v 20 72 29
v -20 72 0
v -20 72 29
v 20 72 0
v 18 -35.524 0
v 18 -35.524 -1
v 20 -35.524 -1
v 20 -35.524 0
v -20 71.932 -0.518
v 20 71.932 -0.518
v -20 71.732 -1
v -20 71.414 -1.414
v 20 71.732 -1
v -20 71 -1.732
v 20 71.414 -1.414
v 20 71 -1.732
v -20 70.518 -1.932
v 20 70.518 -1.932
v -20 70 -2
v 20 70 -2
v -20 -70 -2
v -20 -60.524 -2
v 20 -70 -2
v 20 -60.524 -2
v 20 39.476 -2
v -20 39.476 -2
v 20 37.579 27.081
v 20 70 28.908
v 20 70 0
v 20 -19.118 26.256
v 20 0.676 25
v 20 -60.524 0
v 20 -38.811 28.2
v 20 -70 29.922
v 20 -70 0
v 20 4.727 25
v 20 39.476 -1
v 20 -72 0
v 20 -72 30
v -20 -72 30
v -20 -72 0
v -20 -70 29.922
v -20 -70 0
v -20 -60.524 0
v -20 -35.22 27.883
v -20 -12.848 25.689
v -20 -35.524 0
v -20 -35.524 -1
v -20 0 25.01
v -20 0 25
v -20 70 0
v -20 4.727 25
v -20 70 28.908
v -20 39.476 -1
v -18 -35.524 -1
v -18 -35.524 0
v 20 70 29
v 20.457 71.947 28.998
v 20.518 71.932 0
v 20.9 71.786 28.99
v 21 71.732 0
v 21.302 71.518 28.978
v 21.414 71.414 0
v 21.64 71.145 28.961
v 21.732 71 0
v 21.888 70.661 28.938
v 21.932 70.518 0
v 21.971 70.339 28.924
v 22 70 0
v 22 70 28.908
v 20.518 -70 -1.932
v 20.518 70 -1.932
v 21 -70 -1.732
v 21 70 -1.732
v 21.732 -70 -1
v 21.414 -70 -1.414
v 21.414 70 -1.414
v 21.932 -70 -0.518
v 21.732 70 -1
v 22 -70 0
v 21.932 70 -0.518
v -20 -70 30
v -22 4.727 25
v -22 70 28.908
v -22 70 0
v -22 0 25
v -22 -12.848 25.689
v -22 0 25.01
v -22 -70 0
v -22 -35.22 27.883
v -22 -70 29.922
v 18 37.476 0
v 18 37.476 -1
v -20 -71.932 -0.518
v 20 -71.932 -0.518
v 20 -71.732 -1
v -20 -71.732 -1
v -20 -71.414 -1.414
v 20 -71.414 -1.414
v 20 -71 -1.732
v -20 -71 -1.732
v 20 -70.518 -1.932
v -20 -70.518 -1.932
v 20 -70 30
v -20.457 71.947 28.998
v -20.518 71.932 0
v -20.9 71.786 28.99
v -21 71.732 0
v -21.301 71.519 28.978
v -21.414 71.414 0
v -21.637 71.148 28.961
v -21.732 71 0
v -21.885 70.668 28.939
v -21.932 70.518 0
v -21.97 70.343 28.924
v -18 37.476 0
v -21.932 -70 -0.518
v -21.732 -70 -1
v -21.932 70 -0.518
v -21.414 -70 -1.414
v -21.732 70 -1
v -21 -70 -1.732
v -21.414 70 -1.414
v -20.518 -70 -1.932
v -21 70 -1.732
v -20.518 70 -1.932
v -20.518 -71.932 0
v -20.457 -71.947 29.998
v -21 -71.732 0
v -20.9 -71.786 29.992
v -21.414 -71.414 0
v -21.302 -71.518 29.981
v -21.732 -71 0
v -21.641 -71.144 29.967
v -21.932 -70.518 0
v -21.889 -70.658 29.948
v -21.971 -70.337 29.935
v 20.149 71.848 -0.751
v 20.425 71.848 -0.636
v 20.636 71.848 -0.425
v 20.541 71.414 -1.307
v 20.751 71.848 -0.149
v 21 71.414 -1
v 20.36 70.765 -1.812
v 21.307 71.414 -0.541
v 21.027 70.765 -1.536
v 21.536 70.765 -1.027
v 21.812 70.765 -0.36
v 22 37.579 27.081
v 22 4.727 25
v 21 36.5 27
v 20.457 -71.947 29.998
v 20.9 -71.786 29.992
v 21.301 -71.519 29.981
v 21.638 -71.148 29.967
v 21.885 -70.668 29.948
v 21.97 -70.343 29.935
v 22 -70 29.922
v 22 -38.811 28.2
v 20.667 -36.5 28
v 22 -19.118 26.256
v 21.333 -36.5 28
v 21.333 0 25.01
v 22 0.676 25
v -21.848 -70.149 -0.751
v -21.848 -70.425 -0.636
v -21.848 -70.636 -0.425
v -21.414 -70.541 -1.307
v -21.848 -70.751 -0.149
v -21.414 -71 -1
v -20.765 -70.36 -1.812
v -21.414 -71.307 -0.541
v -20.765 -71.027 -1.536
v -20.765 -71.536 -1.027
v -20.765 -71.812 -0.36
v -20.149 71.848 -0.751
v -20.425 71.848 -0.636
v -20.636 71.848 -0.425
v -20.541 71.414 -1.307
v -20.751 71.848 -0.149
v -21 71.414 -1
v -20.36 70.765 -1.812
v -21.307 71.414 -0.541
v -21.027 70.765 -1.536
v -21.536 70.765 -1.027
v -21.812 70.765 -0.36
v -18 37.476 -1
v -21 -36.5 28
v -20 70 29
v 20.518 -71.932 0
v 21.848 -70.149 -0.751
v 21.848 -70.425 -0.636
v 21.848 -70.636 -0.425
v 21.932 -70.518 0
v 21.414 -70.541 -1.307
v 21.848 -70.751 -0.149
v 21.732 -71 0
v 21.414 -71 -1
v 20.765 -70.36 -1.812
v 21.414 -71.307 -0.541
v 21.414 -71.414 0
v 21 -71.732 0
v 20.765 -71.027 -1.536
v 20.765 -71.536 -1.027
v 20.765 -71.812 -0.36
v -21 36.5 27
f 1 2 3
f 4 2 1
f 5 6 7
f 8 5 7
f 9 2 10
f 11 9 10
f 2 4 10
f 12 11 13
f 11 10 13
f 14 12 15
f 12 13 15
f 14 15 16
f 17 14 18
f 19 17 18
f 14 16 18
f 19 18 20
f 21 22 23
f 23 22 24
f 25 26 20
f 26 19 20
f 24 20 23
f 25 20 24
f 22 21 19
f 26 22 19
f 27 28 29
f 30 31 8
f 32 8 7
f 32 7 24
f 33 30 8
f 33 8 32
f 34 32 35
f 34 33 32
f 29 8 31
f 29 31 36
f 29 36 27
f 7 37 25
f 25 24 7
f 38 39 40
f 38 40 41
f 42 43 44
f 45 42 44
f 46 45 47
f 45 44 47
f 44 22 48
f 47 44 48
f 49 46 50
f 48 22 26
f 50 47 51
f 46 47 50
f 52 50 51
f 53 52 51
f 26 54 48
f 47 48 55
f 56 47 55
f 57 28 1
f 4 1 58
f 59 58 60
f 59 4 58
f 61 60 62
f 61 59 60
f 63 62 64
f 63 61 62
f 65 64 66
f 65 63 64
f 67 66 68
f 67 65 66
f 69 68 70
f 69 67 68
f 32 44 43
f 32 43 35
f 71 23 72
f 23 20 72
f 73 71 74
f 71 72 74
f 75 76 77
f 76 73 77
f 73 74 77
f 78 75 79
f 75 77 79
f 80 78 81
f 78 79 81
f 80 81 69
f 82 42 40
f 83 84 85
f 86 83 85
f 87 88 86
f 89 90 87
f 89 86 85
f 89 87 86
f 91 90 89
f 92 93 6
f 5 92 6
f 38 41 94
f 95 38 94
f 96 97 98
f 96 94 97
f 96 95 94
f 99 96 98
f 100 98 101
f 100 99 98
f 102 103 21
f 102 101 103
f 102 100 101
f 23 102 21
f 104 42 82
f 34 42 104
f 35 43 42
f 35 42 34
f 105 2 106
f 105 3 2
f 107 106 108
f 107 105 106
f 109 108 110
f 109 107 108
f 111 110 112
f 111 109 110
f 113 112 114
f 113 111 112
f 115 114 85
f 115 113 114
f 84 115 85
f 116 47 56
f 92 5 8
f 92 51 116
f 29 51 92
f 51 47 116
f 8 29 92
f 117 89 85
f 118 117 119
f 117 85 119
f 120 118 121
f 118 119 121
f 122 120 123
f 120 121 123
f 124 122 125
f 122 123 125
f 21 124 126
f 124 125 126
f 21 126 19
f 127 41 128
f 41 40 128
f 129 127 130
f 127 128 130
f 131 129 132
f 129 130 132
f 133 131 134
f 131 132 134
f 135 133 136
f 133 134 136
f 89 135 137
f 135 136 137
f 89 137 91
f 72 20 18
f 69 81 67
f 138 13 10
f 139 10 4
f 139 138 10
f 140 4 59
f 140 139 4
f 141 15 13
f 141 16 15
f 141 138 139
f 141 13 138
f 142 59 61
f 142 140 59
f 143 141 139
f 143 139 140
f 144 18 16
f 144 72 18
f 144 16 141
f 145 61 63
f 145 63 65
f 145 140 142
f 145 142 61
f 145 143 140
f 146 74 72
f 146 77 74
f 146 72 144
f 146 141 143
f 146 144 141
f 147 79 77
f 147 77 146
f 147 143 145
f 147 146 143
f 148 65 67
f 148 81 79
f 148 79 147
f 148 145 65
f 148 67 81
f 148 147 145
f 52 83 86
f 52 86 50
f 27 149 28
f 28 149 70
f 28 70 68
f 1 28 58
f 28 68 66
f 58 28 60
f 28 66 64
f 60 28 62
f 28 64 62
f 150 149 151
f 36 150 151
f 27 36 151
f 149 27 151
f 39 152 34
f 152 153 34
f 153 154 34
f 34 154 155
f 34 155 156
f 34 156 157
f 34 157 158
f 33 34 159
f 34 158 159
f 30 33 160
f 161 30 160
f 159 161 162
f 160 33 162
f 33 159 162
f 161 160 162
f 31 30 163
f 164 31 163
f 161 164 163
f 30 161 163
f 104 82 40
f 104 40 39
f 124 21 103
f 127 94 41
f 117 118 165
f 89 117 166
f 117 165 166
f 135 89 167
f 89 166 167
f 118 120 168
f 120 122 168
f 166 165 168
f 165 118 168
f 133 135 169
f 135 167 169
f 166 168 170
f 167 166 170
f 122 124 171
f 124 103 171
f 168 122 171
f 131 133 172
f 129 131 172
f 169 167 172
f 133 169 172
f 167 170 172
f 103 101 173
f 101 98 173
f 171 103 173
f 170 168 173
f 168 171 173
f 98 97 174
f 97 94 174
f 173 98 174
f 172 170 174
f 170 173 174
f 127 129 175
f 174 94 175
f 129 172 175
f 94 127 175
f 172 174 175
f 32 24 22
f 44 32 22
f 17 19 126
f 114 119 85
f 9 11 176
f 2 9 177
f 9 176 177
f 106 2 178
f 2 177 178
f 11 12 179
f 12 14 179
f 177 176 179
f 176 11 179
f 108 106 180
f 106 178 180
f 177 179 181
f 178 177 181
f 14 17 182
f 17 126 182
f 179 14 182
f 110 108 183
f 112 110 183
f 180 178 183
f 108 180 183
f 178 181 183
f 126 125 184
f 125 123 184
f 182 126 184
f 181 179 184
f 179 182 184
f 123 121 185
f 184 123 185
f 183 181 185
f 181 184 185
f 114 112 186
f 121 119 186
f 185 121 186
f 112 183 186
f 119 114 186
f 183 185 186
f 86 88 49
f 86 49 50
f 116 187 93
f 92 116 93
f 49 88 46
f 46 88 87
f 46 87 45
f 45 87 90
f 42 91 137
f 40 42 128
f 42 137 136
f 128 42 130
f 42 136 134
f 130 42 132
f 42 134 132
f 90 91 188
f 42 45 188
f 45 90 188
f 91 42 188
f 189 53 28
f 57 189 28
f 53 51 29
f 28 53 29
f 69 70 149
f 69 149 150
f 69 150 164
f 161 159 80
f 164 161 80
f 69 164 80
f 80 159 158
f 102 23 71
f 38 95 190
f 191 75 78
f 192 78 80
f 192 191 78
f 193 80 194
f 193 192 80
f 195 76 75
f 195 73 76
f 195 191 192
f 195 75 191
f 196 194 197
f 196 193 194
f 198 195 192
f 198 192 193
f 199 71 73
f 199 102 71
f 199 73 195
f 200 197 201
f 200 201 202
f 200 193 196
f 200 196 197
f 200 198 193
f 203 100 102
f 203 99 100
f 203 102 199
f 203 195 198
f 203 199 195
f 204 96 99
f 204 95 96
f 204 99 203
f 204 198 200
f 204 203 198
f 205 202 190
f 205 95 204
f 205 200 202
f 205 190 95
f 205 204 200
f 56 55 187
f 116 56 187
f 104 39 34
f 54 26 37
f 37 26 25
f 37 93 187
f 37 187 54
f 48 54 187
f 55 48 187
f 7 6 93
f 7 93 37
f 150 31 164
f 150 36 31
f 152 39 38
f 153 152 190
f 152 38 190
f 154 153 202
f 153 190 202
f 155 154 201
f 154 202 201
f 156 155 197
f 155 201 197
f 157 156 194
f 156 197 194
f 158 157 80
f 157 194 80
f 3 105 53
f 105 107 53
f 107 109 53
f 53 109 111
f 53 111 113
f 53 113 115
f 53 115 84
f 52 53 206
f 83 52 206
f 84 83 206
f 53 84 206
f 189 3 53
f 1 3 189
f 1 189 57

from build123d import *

# Parameters (mm, degrees)
F0_W      = 44
F0_H      = 144
F0_W_2    = 40
F0_H_2    = 140
F1_DEPTH  = 2
F2_DEPTH  = 25
F5_DEPTH  = 2
F6_DEPTH  = 2
F7_DEPTH  = 5
F8_DEPTH  = 4
F10_DEPTH = 32.0010001
F9_W      = 36
F9_H      = 2
F9_W_2    = 2
F9_H_2    = 73
F11_DEPTH = 1
F12_R     = 1.99999


# Not quite as in the source:
# - a fillet or chamfer is up to 0.001 mm smaller than in the source, because OpenCascade refuses the exact size


with BuildPart() as f1:
    # F0 (on Top) → F1 (new body)
    with BuildSketch(Plane.XY):
        Rectangle(F0_W, F0_H)
        Rectangle(F0_W_2, F0_H_2, mode=Mode.SUBTRACT)
        Rectangle(F0_W_2, F0_H_2)
    extrude(amount=-F1_DEPTH)

    # F0 (on Top) → F2 (join)
    with BuildSketch(Plane.XY):
        Rectangle(F0_W, F0_H)
        Rectangle(F0_W_2, F0_H_2, mode=Mode.SUBTRACT)
    extrude(amount=F2_DEPTH)

    # F3 (on face) → F5 (join)
    with BuildSketch(Plane.YZ.offset(22)):
        with BuildLine():
            add(Edge.make_bspline(
                [(4.7271151019, 25), (15.348527654, 25.1268953042), (37.9929862917, 27.4159301893), (60.2495129104, 28.4605212291), (72, 29)],
                knots=[0.5326300299, 0.5326300299, 0.5326300299, 0.5326300299, 0.7517880542, 1, 1, 1, 1], degree=3))
            Line((4.7271151019, 25), (72, 25))
            Line((72, 25), (72, 29))
        make_face()
        with BuildLine():
            Line((-72, 30), (-72, 25))
            Line((-72, 25), (0.6763282883, 25))
            add(Edge.make_bspline(
                [(-72, 30), (-60.2445668251, 29.5430569498), (-36.4192696174, 28.5876982607), (-11.9822251211, 25.1864507884), (0.4508819142, 25.0028330974), (0.6763282883, 25)],
                knots=[0, 0, 0, 0, 0.2482119458, 0.5001170824, 0.504769099, 0.504769099, 0.504769099, 0.504769099], degree=3))
        make_face()
    extrude(amount=-F5_DEPTH)

    # F4 (on face) → F6 (join)
    with BuildSketch(Plane(origin=(-22, 0, 0), x_dir=(0, -1, 0), z_dir=(-1, 0, 0))):
        with BuildLine():
            Line((-72, 29), (-72, 25))
            Line((-72, 25), (-4.7271151019, 25))
            add(Edge.make_bspline(
                [(-72, 29), (-60.2495129104, 28.4605212291), (-37.9929862917, 27.4159301893), (-15.348527654, 25.1268953042), (-4.7271151019, 25)],
                knots=[0, 0, 0, 0, 0.2482119458, 0.4673699701, 0.4673699701, 0.4673699701, 0.4673699701], degree=3))
        make_face()
        with BuildLine():
            Line((0, 25), (72, 25))
            Line((72, 25), (72, 30))
            add(Edge.make_bspline(
                [(0, 25.01), (12.2074400514, 25.2177971205), (36.4192696174, 28.5876982607), (60.2445668251, 29.5430569498), (72, 30)],
                knots=[0.4998829176, 0.4998829176, 0.4998829176, 0.4998829176, 0.7517880542, 1, 1, 1, 1], degree=3))
            Line((0, 25.01), (0, 25))
        make_face()
    extrude(amount=-F6_DEPTH)

    # F7 (add): a face of the model
    f7_faces = [f1.faces().sort_by_distance(p)[0] for p in [
        (0, -71, 25),
    ]]
    extrude(f7_faces, amount=F7_DEPTH)

    # F8 (add): a face of the model
    f8_faces = [f1.faces().sort_by_distance(p)[0] for p in [
        (0, 71, 25),
    ]]
    extrude(f8_faces, amount=F8_DEPTH)

    # F9 (on face) → F10 (cut, through all)
    with BuildSketch(Plane(origin=(0, 0, -2), x_dir=(1, 0, 0), z_dir=(0, 0, -1))):
        Polygon((20, 35.5240486562), (20, 60.5240486562), (-20, 60.5240486562), (-20, 35.5240486562), (-18, 35.5240486562), (-18, -37.4759513438), (18, -37.4759513438), (18, 35.5240486562), align=None)
    extrude(amount=-F10_DEPTH, mode=Mode.SUBTRACT)

    # F9 (on face) → F11 (cut)
    with BuildSketch(Plane(origin=(0, 0, -2), x_dir=(1, 0, 0), z_dir=(0, 0, -1))):
        with Locations((0, -38.4759513438)):
            Rectangle(F9_W, F9_H)
        with Locations((-19, -38.4759513438)):
            Rectangle(F9_W_2, F9_H)
        with Locations((-19, -0.9759513438)):
            Rectangle(F9_W_2, F9_H_2)
        with Locations((19, -38.4759513438)):
            Rectangle(F9_W_2, F9_H)
        with Locations((19, -0.9759513438)):
            Rectangle(F9_W_2, F9_H_2)
    extrude(amount=-F11_DEPTH, mode=Mode.SUBTRACT)

    # F12 (radius 2 in the source; OpenCascade refuses exactly that, so slightly less here)
    f12_edges = [f1.edges().sort_by_distance(p)[0] for p in [
        (0, -72, -2),
        (-22, 0, -2),
        (22, 0, -2),
        (-22, -72, 14),
        (22, -72, 14),
        (0, 72, -2),
        (-22, 72, 13.5),
        (22, 72, 13.5),
    ]]
    fillet(f12_edges, radius=F12_R)


solid = f1.part
